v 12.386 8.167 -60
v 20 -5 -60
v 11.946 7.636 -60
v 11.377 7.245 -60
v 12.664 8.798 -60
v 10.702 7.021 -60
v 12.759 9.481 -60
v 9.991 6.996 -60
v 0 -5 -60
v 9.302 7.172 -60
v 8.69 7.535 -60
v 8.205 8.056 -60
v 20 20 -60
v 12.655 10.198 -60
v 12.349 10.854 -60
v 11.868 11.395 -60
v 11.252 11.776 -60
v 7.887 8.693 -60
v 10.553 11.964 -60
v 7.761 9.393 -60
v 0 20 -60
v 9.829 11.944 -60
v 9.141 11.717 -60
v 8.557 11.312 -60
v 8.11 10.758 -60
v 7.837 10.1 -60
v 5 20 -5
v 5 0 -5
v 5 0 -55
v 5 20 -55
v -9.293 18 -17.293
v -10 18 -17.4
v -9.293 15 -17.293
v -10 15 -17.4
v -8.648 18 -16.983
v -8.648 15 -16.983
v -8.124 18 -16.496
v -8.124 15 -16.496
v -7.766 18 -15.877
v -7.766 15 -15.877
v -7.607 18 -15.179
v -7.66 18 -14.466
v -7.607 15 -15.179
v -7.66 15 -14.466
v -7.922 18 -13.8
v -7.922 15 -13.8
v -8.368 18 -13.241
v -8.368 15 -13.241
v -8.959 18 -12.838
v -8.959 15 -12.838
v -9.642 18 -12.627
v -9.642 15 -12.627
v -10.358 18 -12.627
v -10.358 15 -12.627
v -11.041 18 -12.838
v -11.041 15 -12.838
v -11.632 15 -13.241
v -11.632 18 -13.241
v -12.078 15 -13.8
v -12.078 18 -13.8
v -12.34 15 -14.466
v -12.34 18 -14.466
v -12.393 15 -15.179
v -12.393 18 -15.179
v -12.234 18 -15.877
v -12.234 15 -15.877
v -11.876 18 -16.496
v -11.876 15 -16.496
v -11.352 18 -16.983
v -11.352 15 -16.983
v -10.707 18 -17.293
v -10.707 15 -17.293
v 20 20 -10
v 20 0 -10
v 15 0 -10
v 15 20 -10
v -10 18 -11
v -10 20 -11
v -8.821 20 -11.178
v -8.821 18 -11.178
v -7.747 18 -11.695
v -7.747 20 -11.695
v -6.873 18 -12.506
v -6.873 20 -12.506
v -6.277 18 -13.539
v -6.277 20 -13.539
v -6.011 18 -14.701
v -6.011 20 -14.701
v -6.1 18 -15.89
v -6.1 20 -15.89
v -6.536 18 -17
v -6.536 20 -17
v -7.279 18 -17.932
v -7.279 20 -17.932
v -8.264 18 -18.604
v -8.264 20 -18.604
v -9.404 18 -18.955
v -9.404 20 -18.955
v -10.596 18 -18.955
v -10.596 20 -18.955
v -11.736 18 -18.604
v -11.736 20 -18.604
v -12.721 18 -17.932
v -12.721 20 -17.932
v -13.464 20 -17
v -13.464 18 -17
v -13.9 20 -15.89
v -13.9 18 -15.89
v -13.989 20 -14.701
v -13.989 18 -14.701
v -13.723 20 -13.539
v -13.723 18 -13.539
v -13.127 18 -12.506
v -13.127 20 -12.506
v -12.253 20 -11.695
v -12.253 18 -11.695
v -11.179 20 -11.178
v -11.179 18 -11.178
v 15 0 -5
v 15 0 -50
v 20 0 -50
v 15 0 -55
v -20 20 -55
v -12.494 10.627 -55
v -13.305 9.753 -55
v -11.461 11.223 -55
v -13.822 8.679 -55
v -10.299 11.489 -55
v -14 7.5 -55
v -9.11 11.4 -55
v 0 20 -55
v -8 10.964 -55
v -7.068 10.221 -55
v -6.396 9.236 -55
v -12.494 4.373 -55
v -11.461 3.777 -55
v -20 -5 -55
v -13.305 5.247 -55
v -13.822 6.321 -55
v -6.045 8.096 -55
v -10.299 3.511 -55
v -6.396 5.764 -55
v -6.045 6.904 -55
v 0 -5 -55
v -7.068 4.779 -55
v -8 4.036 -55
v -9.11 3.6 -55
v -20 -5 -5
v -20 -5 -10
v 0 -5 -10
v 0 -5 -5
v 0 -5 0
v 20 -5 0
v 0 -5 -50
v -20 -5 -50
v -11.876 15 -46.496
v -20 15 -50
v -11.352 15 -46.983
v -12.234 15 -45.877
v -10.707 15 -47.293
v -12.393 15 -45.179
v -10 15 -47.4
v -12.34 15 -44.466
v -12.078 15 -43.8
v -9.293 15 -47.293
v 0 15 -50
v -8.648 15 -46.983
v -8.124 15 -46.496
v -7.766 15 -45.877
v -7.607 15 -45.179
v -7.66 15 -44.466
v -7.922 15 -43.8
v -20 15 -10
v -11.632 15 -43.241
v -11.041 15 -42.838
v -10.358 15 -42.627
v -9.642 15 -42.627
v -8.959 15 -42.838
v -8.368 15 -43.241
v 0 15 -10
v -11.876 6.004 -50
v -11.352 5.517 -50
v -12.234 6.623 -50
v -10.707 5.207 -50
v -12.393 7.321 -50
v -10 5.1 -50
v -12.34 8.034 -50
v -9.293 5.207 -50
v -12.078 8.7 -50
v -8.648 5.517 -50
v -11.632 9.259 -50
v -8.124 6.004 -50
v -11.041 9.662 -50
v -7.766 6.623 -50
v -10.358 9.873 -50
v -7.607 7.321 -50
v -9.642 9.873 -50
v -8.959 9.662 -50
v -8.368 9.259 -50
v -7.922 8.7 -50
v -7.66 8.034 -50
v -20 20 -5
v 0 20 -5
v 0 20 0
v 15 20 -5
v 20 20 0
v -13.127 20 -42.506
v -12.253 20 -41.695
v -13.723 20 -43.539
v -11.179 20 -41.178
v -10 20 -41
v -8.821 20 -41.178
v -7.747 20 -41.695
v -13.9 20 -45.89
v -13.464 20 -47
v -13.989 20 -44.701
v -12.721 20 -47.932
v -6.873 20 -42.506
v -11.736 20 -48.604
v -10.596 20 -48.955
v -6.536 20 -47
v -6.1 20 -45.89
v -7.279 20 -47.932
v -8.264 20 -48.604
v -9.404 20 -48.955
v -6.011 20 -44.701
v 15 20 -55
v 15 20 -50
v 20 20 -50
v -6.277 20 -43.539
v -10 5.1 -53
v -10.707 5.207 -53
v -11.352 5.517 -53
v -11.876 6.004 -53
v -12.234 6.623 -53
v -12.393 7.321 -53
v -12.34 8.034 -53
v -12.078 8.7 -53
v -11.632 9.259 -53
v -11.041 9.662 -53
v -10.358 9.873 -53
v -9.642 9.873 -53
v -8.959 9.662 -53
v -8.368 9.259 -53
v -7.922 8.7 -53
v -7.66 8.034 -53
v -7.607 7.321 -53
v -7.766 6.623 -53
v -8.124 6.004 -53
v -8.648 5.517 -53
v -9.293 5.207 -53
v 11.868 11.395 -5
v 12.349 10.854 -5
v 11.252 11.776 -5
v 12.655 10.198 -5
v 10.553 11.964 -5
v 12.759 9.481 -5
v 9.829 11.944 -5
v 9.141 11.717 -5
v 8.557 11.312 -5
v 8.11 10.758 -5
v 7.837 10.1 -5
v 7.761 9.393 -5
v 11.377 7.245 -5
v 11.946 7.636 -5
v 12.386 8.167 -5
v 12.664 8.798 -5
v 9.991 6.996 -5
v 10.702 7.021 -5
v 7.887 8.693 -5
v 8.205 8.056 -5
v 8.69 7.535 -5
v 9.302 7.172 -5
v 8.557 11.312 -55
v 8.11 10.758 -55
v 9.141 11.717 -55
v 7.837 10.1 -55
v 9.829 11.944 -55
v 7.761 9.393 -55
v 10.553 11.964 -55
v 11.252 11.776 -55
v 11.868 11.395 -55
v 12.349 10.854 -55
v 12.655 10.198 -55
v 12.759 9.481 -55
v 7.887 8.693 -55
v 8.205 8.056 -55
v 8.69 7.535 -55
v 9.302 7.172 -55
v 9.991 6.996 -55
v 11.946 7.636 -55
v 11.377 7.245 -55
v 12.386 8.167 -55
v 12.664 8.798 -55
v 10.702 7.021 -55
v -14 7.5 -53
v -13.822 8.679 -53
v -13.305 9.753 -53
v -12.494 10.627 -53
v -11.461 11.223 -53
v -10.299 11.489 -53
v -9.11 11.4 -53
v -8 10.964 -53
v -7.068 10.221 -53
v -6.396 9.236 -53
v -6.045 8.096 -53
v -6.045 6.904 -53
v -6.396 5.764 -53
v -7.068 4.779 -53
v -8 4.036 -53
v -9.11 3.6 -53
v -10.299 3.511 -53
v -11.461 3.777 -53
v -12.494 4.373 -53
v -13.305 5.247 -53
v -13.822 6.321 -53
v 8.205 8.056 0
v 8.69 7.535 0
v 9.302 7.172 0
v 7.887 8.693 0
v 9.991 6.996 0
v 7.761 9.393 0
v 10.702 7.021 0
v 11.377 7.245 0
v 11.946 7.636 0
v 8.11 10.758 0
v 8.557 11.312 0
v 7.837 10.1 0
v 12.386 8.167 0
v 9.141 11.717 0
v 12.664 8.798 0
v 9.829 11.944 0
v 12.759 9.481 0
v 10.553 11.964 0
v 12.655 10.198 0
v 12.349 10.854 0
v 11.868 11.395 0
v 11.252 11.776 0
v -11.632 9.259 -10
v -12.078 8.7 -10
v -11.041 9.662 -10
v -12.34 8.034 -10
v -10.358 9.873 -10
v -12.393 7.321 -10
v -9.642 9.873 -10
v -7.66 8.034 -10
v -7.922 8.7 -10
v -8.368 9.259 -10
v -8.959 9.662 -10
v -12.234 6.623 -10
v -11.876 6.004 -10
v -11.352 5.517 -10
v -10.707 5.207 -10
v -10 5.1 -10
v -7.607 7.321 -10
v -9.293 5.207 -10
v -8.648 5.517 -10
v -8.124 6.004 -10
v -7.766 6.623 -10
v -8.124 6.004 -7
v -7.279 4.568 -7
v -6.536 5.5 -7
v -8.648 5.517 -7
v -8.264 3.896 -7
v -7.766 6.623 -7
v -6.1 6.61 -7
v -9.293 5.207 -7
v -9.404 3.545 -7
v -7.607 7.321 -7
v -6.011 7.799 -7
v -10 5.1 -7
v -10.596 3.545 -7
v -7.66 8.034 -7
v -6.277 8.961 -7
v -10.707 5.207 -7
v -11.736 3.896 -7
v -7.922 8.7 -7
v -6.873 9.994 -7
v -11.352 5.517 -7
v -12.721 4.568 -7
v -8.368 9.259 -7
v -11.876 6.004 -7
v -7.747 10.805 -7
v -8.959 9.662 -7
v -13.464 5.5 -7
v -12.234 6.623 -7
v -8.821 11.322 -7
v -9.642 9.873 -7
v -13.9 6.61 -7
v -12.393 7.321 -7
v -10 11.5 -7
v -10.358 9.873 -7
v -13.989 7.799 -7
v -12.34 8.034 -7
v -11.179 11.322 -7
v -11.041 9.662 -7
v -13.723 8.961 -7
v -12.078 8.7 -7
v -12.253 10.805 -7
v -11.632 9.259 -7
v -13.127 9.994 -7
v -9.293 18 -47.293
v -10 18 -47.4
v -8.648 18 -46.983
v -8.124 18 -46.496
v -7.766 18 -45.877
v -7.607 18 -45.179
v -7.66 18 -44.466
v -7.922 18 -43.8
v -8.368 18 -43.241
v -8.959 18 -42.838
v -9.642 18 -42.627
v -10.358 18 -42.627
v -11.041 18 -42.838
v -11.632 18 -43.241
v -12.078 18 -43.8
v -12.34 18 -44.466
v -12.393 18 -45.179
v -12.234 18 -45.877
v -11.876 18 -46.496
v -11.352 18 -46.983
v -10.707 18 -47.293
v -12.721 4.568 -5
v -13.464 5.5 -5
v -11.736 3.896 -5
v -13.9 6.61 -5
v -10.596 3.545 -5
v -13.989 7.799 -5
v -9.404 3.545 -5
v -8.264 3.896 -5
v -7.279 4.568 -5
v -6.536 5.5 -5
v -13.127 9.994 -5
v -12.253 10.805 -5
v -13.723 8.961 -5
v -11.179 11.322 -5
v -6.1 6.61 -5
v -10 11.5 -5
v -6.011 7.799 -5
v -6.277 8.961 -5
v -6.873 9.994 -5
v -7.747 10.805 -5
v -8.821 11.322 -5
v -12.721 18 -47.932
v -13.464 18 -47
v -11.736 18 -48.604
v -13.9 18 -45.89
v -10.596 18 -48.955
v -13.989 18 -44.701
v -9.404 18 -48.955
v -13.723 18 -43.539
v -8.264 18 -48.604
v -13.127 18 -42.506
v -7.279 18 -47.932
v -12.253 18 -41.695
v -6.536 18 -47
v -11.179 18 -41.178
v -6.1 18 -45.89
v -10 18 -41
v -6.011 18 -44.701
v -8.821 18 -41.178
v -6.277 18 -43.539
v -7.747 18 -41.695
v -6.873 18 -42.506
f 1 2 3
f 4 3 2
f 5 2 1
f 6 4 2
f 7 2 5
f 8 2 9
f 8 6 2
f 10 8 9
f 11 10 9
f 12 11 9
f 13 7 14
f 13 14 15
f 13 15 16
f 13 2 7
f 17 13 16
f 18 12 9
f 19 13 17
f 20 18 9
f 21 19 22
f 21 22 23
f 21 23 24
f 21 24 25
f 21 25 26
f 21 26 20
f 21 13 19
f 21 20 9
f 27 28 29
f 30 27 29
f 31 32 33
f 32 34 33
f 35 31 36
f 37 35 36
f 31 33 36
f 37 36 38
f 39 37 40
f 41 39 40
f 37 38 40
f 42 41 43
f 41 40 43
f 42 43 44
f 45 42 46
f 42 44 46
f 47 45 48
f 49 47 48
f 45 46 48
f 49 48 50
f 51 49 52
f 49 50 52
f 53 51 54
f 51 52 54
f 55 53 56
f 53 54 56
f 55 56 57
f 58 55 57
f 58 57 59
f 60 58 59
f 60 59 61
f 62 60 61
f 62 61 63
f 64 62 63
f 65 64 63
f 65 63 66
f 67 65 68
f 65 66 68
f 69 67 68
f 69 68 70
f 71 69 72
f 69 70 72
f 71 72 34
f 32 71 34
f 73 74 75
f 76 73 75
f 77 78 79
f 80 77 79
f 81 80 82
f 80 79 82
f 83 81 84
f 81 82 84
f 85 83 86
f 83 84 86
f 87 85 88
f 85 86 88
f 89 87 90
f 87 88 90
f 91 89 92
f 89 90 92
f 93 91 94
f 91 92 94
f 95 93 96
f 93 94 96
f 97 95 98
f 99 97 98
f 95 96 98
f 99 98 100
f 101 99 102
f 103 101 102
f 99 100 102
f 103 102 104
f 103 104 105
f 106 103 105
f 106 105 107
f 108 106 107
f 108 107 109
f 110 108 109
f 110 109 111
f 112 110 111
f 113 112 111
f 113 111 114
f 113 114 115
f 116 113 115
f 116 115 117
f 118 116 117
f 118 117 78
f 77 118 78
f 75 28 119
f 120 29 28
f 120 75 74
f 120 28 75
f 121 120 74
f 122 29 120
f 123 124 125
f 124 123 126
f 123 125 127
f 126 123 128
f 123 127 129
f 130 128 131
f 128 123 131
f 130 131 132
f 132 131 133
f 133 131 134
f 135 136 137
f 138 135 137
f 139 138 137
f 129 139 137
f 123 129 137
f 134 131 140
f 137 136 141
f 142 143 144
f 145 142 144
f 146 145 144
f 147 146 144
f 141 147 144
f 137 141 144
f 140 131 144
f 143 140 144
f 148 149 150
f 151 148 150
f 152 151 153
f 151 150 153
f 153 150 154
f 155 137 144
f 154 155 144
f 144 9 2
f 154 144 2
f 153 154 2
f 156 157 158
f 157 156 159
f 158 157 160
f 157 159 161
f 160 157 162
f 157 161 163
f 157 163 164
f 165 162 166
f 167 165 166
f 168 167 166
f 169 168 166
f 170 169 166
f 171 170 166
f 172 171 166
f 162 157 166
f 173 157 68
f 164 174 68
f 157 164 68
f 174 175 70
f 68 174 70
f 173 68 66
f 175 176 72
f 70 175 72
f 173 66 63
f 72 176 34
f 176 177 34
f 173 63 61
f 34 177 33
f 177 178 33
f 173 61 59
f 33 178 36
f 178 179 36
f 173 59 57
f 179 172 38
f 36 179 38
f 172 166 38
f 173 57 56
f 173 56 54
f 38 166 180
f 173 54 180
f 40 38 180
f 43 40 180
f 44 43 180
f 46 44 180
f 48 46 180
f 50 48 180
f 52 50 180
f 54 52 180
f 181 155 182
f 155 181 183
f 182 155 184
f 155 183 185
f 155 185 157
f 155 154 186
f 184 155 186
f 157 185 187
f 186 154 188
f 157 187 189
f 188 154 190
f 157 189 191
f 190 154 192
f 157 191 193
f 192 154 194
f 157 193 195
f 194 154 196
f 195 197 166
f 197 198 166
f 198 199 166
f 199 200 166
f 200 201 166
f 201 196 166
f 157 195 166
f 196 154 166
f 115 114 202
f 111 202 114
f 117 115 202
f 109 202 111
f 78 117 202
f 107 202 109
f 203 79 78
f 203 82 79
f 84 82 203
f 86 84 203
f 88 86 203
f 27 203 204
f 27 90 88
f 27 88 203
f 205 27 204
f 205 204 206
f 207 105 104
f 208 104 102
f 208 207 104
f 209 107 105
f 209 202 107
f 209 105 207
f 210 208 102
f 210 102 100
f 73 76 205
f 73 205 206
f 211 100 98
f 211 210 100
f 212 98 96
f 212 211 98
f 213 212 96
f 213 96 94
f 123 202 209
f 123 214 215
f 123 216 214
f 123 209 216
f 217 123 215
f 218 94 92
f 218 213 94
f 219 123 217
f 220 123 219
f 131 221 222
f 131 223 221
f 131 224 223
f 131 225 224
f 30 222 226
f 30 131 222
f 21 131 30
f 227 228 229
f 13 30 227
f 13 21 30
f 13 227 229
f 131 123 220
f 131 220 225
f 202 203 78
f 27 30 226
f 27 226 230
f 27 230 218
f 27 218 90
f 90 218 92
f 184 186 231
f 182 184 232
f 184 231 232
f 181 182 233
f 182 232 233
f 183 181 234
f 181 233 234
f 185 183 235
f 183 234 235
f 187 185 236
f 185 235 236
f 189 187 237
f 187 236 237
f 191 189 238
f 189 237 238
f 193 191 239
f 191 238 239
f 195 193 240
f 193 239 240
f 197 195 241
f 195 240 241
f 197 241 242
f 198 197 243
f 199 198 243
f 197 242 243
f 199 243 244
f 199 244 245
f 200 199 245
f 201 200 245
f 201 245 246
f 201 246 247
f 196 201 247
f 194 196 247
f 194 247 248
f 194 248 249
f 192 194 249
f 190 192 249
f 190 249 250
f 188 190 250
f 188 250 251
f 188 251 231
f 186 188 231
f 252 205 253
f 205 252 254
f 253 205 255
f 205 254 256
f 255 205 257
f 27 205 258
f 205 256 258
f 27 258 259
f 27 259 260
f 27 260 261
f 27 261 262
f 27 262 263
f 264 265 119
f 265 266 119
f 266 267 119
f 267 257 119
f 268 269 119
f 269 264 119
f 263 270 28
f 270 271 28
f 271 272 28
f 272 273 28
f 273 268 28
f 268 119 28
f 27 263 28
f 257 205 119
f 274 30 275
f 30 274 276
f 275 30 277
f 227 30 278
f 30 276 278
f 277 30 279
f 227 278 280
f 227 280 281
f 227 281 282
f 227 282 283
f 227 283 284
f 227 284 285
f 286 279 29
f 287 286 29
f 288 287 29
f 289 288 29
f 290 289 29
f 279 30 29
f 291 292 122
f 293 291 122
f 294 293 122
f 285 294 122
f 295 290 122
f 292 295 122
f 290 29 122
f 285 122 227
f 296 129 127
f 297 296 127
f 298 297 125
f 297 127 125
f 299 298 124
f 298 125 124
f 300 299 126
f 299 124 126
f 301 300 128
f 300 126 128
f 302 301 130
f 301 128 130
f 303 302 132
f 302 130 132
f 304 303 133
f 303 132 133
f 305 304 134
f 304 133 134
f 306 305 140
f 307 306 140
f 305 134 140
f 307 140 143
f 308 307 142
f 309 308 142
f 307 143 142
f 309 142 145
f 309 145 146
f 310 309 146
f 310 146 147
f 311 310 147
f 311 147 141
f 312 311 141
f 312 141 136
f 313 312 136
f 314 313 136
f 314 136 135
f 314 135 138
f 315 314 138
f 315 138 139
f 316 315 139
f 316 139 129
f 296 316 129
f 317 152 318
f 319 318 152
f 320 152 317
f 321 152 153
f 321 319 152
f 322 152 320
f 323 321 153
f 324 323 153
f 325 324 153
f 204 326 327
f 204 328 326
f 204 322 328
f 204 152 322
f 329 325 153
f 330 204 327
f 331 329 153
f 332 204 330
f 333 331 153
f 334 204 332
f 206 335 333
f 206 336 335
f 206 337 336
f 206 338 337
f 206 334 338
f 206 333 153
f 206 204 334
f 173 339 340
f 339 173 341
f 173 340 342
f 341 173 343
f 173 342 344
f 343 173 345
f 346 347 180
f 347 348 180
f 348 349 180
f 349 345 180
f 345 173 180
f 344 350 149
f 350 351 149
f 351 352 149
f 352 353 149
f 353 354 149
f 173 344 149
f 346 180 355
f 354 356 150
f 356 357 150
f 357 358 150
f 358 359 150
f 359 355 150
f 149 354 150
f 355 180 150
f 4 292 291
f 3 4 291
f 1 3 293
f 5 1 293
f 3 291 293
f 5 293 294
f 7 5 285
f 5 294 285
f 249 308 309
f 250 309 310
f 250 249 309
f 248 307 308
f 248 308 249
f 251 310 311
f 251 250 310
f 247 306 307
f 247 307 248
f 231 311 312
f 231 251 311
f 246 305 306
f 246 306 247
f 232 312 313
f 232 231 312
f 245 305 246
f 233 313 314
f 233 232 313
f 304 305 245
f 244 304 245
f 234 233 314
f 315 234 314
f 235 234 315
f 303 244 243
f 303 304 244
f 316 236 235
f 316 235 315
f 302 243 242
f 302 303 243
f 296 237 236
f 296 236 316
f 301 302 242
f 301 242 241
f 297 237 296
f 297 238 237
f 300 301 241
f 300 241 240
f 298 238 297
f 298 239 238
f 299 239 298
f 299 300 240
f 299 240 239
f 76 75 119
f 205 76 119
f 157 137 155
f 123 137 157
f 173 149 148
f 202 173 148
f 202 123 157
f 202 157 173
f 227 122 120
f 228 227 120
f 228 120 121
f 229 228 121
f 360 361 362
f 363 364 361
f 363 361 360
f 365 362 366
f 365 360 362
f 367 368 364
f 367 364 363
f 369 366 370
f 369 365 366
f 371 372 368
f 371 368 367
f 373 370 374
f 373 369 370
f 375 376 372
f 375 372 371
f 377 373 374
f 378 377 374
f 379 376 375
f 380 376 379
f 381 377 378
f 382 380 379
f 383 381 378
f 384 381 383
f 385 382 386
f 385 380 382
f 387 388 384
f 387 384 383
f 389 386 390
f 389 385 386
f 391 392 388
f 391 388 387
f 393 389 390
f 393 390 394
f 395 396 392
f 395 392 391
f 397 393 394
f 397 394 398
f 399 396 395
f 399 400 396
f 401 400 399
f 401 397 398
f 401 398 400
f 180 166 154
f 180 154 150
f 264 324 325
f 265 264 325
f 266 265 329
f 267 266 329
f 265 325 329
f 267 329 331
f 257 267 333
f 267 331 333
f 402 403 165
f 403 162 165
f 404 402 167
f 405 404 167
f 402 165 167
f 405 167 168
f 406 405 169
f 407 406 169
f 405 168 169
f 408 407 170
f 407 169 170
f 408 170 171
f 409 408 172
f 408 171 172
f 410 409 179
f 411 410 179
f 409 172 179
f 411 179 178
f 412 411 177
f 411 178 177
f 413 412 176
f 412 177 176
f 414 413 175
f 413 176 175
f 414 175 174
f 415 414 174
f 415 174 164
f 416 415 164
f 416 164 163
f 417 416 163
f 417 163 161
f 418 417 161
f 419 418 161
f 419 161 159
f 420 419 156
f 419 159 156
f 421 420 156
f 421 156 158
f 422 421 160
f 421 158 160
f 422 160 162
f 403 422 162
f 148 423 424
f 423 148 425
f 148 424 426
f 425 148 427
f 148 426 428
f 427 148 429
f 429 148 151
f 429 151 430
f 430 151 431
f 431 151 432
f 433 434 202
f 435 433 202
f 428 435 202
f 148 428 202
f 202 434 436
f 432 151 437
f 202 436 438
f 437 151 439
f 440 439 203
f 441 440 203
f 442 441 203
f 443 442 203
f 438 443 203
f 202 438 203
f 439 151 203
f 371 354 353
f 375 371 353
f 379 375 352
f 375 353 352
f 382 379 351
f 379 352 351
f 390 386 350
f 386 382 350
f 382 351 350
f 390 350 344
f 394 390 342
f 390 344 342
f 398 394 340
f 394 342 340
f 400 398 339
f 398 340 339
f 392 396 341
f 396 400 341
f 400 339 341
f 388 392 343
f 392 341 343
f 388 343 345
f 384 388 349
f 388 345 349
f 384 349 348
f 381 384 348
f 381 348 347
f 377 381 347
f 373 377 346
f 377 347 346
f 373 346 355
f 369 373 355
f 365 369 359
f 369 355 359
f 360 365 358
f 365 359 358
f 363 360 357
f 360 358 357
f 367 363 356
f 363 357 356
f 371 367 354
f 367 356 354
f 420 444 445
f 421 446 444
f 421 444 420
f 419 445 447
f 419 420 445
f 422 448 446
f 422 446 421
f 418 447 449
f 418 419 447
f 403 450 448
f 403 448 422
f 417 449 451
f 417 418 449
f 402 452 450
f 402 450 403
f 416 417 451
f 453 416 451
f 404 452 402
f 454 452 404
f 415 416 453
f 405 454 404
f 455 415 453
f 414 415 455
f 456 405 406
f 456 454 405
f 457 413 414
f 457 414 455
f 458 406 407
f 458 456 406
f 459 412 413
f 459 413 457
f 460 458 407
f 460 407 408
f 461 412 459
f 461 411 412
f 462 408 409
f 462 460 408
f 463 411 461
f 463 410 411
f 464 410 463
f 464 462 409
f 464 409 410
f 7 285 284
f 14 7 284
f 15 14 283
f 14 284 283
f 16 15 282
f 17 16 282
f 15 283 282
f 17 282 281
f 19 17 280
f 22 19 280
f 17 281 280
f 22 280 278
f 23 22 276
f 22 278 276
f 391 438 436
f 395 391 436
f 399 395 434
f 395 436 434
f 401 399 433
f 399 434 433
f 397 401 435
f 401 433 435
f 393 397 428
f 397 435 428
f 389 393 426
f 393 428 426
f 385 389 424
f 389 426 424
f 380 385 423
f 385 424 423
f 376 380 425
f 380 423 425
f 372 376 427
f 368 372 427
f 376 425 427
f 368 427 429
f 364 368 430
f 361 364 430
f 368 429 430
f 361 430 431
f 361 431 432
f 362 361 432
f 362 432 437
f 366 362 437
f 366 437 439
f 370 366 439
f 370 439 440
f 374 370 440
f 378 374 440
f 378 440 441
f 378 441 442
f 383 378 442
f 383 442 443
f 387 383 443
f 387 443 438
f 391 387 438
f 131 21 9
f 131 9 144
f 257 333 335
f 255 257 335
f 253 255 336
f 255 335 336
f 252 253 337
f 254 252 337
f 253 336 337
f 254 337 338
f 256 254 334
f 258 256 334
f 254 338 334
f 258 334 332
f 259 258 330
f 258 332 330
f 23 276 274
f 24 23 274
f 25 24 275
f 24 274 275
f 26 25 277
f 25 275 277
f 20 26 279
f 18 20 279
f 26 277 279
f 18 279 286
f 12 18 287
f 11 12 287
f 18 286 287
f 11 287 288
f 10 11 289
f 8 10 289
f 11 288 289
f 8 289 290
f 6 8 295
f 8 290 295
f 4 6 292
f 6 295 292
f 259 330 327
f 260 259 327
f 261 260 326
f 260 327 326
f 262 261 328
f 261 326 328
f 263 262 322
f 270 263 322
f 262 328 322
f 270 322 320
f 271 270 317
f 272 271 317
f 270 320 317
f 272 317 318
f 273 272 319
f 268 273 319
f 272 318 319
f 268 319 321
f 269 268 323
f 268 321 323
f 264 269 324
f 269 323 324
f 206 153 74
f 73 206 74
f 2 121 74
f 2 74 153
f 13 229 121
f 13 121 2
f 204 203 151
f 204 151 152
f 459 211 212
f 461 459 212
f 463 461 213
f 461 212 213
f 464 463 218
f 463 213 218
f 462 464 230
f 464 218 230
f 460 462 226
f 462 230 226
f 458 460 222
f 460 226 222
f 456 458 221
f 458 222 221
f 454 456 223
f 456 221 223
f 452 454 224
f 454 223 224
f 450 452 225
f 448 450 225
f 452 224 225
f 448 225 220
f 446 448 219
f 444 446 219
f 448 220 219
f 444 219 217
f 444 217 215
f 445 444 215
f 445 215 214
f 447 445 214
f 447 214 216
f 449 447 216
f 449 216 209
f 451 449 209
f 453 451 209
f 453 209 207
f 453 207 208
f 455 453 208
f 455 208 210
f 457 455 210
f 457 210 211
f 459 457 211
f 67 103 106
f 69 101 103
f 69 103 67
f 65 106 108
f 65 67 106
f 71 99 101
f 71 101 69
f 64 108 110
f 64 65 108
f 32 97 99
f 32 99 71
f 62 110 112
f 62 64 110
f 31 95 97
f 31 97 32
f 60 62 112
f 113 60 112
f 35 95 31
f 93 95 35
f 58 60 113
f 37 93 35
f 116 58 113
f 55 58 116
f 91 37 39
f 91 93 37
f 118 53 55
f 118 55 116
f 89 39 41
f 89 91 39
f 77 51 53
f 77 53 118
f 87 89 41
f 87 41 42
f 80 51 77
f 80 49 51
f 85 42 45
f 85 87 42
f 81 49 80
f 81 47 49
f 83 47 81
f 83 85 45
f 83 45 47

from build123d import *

# Parameters (mm, degrees)
ESQUISSE1_W                                       = 5
ESQUISSE1_H                                       = 40
BOSS_EXTRU_1_DEPTH                                = 20
ESQUISSE1_3_W                                     = 5
ESQUISSE1_3_H                                     = 40
ESQUISSE1_3_W_2                                   = 10
ESQUISSE1_3_H_2                                   = 5
BOSS_EXTRU_2_DEPTH                                = 5
ESQUISSE3_W                                       = 40
ESQUISSE3_H                                       = 5
BOSS_EXTRU_3_DEPTH                                = 20
ENL_V_MAT_EXTRU_2_DEPTH                           = 40
ENL_V_MAT_EXTRU_2_DEPTH_BACK                      = 61
CHAMBRAGE_POUR_VIS_SIX_PANS_CREUX_M41_D           = 4.8
CHAMBRAGE_POUR_VIS_SIX_PANS_CREUX_M41_CBORE_D     = 8
CHAMBRAGE_POUR_VIS_SIX_PANS_CREUX_M41_CBORE_DEPTH = 2
CHAMBRAGE_POUR_VIS_SIX_PANS_CREUX_2_D             = 4.8
CHAMBRAGE_POUR_VIS_SIX_PANS_CREUX_2_CBORE_D       = 8
CHAMBRAGE_POUR_VIS_SIX_PANS_CREUX_2_CBORE_DEPTH   = 2
CHAMBRAGE_POUR_VIS_SIX_PANS_CREUX_3_D             = 4.8
CHAMBRAGE_POUR_VIS_SIX_PANS_CREUX_3_CBORE_D       = 8
CHAMBRAGE_POUR_VIS_SIX_PANS_CREUX_3_CBORE_DEPTH   = 2


with BuildPart() as part:
    # Esquisse1 → Boss.-Extru.1 (new body)
    with BuildSketch(Plane(origin=(0, 0, 0), x_dir=(1, 0, 0), z_dir=(0, 1, 0))):
        with Locations((2.5, 30)):
            Rectangle(ESQUISSE1_W, ESQUISSE1_H)
        Polygon((0, 50), (5, 50), (5, 55), (15, 55), (15, 50), (20, 50), (20, 60), (0, 60), align=None)
        Polygon((15, 5), (5, 5), (5, 10), (0, 10), (0, 0), (20, 0), (20, 10), (15, 10), align=None)
    extrude(amount=BOSS_EXTRU_1_DEPTH)

    # Esquisse1<3> → Boss.-Extru.2 (add)
    with BuildSketch(Plane(origin=(0, 0, 0), x_dir=(1, 0, 0), z_dir=(0, 1, 0))):
        Polygon((0, 50), (5, 50), (5, 55), (15, 55), (15, 50), (20, 50), (20, 60), (0, 60), align=None)
        with Locations((17.5, 30)):
            Rectangle(ESQUISSE1_3_W, ESQUISSE1_3_H)
        with Locations((10, 52.5)):
            Rectangle(ESQUISSE1_3_W_2, ESQUISSE1_3_H_2)
        with Locations((10, 30)):
            Rectangle(ESQUISSE1_3_W_2, ESQUISSE1_3_H)
        with Locations((2.5, 30)):
            Rectangle(ESQUISSE1_3_W, ESQUISSE1_3_H)
        Polygon((15, 5), (5, 5), (5, 10), (0, 10), (0, 0), (20, 0), (20, 10), (15, 10), align=None)
        with Locations((10, 7.5)):
            Rectangle(ESQUISSE1_3_W_2, ESQUISSE1_3_H_2)
    extrude(amount=-BOSS_EXTRU_2_DEPTH)

    # Esquisse3 → Boss.-Extru.3 (add)
    with BuildSketch(Plane.ZY):
        Polygon((-55, 20), (-55, -5), (-50, -5), (-50, 15), (-50, 20), align=None)
        Polygon((-10, 15), (-10, -5), (-5, -5), (-5, 20), (-10, 20), align=None)
        with Locations((-30, 17.5)):
            Rectangle(ESQUISSE3_W, ESQUISSE3_H)
    extrude(amount=BOSS_EXTRU_3_DEPTH)

    # Esquisse4 → Enlèv. mat.-Extru.2 (cut, two sides)
    with BuildSketch(Plane.XY) as enl_v_mat_extru_2_sk:
        with BuildLine():
            ThreePointArc((12.759432597, 9.481134806), (11.573760378, 11.607761826), (9.141398608, 11.717202783))
            Line((9.141398608, 11.717202783), (11.377466586, 7.245066828))
            ThreePointArc((11.377466586, 7.245066828), (12.386059618, 8.166807025), (12.759432597, 9.481134806))
        make_face()
        with BuildLine():
            Line((11.377466586, 7.245066828), (9.141398608, 11.717202783))
            ThreePointArc((9.141398608, 11.717202783), (8.02336462, 8.363100817), (11.377466586, 7.245066828))
        make_face()
    extrude(amount=ENL_V_MAT_EXTRU_2_DEPTH, mode=Mode.SUBTRACT)
    extrude(enl_v_mat_extru_2_sk.sketch, amount=-ENL_V_MAT_EXTRU_2_DEPTH_BACK, mode=Mode.SUBTRACT)

    # Chambrage pour vis à six pans creux M41 (through all)
    with Locations(Plane(origin=(-10, 7.5, -5), x_dir=(0, 1, 0), z_dir=(0, 0, 1))):
        with Locations((0, 0)):
            CounterBoreHole(CHAMBRAGE_POUR_VIS_SIX_PANS_CREUX_M41_D / 2, CHAMBRAGE_POUR_VIS_SIX_PANS_CREUX_M41_CBORE_D / 2, CHAMBRAGE_POUR_VIS_SIX_PANS_CREUX_M41_CBORE_DEPTH)

    # Chambrage pour vis _ six pans creux  2 (through all)
    with Locations(Plane(origin=(-10, 20, -45), x_dir=(0, 0, 1), z_dir=(0, 1, 0))):
        with Locations((0, 0), (30, 0)):
            CounterBoreHole(CHAMBRAGE_POUR_VIS_SIX_PANS_CREUX_2_D / 2, CHAMBRAGE_POUR_VIS_SIX_PANS_CREUX_2_CBORE_D / 2, CHAMBRAGE_POUR_VIS_SIX_PANS_CREUX_2_CBORE_DEPTH)

    # Chambrage pour vis _ six pans creux  3 (through all)
    with Locations(Plane(origin=(-10, 7.5, -55), x_dir=(-1, 0, 0), z_dir=(0, 0, -1))):
        with Locations((0, 0)):
            CounterBoreHole(CHAMBRAGE_POUR_VIS_SIX_PANS_CREUX_3_D / 2, CHAMBRAGE_POUR_VIS_SIX_PANS_CREUX_3_CBORE_D / 2, CHAMBRAGE_POUR_VIS_SIX_PANS_CREUX_3_CBORE_DEPTH)


solid = part.part
